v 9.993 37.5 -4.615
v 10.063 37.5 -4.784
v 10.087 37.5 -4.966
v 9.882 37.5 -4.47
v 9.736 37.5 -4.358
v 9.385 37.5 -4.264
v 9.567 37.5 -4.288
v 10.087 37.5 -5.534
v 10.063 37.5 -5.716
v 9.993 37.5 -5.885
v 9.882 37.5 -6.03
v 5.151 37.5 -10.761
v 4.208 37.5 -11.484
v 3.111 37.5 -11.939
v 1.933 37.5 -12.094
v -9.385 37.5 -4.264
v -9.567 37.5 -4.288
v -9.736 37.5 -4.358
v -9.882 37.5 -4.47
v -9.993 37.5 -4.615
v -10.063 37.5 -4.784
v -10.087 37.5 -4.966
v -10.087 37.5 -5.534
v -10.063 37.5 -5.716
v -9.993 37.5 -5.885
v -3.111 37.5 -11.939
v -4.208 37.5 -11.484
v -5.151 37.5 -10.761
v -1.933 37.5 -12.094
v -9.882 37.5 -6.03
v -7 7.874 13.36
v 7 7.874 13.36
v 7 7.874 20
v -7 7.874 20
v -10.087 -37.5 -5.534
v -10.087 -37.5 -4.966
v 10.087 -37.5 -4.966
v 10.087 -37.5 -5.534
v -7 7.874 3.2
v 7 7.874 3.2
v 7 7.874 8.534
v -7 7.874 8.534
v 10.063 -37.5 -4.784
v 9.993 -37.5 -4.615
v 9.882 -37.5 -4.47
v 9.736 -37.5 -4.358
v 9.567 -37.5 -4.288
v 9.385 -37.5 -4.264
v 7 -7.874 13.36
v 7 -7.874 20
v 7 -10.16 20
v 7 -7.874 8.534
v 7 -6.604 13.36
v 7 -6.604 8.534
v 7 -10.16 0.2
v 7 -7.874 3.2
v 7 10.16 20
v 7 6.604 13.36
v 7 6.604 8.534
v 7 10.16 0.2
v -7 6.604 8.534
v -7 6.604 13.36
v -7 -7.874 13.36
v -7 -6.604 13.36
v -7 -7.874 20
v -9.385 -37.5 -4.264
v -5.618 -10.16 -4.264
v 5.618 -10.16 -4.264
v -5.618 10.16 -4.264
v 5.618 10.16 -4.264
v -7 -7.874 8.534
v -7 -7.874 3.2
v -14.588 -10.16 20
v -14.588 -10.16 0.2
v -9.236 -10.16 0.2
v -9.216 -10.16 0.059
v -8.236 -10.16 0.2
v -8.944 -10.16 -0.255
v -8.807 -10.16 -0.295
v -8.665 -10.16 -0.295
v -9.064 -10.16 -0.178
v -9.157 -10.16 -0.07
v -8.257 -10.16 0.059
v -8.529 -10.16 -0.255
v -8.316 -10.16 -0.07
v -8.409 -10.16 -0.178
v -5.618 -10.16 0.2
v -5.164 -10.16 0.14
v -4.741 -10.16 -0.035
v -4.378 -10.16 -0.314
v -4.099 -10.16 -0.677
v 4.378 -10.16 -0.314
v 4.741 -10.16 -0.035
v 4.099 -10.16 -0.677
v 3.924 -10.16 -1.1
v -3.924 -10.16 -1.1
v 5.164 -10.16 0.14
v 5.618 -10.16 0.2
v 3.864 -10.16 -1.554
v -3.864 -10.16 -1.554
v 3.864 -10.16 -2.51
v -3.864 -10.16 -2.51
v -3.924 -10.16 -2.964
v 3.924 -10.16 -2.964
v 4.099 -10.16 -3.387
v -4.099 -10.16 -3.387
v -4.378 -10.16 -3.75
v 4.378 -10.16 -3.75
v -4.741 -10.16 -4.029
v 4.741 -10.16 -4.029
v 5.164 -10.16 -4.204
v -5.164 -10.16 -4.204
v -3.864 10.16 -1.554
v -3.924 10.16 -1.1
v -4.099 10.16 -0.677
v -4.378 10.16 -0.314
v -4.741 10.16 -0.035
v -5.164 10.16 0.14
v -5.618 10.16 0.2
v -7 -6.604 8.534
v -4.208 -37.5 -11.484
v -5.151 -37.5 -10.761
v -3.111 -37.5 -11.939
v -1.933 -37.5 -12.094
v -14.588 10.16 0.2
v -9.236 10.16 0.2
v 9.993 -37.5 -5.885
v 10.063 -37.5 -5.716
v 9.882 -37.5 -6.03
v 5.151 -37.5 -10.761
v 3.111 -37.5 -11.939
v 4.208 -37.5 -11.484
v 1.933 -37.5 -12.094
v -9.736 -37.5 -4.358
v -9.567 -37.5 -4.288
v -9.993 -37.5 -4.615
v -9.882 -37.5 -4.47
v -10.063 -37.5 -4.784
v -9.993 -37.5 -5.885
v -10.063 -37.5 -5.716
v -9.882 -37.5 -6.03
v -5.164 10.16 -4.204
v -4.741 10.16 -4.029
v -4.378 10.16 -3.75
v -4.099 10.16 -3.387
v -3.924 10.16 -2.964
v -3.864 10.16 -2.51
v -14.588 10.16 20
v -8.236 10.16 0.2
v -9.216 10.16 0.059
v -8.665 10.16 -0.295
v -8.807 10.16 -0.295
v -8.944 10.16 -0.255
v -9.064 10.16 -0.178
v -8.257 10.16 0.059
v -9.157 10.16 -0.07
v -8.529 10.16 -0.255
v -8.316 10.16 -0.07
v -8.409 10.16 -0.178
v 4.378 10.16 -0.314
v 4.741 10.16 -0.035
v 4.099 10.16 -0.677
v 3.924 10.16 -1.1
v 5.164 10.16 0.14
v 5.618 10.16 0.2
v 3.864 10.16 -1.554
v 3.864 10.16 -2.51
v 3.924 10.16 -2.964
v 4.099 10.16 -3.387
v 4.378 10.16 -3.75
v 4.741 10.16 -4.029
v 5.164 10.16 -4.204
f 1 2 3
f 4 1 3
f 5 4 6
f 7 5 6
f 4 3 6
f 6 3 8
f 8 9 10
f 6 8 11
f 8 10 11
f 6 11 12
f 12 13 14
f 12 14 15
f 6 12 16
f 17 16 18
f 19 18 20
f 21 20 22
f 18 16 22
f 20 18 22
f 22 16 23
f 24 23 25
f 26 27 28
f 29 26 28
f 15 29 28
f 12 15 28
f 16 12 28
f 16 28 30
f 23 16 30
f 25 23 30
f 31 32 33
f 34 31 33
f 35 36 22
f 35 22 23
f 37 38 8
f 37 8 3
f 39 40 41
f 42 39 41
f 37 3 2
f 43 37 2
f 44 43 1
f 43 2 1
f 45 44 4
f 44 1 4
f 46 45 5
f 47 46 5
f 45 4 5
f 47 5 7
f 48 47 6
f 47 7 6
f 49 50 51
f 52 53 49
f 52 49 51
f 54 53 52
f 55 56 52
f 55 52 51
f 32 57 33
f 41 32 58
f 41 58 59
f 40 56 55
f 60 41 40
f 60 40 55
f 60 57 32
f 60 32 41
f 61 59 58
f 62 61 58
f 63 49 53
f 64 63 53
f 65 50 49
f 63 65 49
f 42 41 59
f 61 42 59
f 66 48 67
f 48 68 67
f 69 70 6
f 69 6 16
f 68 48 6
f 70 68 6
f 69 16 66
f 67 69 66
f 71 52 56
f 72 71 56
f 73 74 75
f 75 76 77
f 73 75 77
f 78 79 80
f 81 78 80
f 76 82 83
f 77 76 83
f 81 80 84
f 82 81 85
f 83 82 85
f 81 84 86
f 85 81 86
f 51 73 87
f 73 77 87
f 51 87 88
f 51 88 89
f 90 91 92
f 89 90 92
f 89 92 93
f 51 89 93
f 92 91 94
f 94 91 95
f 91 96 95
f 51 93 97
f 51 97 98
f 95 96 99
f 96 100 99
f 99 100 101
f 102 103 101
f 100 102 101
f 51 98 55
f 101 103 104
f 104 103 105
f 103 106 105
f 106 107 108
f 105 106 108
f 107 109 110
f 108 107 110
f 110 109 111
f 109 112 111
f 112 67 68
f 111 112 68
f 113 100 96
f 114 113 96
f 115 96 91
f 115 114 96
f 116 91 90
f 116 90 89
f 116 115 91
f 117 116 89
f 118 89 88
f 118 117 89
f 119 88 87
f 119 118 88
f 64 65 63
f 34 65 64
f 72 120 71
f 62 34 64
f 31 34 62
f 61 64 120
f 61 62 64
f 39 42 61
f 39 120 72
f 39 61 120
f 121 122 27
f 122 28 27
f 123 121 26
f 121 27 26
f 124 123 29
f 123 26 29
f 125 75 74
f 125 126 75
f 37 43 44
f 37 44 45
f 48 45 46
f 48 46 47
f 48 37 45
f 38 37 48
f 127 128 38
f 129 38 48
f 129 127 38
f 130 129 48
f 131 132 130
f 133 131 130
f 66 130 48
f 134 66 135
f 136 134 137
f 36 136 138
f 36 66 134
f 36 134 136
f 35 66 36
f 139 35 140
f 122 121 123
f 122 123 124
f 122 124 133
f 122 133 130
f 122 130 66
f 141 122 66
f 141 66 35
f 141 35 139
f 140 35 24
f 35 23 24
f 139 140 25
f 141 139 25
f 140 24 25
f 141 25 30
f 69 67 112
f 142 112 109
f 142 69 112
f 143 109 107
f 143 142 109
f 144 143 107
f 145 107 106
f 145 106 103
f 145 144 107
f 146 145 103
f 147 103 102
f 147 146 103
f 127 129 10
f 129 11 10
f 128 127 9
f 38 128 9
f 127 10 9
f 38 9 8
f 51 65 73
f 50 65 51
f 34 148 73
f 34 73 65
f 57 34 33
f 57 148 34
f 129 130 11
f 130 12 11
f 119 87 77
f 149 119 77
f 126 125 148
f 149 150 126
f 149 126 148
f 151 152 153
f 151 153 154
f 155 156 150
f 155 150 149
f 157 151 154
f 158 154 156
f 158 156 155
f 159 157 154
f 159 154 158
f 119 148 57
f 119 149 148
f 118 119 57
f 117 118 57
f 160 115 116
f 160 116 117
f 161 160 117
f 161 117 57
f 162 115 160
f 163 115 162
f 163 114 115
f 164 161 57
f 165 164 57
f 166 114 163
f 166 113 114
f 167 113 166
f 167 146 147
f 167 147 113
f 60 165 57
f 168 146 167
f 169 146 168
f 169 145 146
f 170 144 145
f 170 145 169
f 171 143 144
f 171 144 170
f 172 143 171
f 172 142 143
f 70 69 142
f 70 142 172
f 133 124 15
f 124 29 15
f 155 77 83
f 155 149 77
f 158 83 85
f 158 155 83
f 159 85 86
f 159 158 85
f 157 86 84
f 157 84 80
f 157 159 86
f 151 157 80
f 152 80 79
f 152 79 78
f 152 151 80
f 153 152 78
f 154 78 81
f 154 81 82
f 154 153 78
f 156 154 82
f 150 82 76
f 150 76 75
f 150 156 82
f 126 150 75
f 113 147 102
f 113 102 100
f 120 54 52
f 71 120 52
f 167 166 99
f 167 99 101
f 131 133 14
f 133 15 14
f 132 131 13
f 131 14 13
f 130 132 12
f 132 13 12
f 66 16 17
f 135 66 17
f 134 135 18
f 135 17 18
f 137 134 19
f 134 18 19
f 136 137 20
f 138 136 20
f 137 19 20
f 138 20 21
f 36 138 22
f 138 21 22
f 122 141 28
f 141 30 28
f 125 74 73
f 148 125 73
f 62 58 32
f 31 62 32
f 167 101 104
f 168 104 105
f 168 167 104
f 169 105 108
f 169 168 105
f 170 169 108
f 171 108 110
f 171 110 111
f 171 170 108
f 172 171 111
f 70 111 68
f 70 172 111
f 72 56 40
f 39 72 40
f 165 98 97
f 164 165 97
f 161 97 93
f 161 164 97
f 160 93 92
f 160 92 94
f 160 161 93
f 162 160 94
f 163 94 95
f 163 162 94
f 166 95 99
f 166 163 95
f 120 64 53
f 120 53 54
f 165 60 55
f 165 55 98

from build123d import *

# Parameters (mm, degrees)
BOSS_EXTRUDE6_DEPTH = 37.5
BOSS_EXTRUDE1_DEPTH = 10.16
CUT_EXTRUDE4_DEPTH  = 14


with BuildPart() as part:
    # Sketch15 → Boss-Extrude6 (new, symmetric)
    with BuildSketch(Plane(origin=(0, 0, 0), x_dir=(1, 0, 0), z_dir=(0, 1, 0))):
        with BuildLine():
            Line((-5.617617549, 4.264), (-9.385342517, 4.264))
            ThreePointArc((-9.385342517, 4.264), (-9.881519345, 4.469523172), (-10.087042517, 4.9657))
            Line((-10.087042517, 4.9657), (-10.087042517, 5.533957914))
            ThreePointArc((-10.087042517, 5.533957914), (-10.03362862, 5.802487278), (-9.881518735, 6.030135353))
            Line((-9.881518735, 6.030135353), (-5.15064406, 10.76099839))
            ThreePointArc((-5.15064406, 10.76099839), (-3.674584079, 11.747268168), (-1.933453584, 12.0936))
            Line((-1.933453584, 12.0936), (1.933453584, 12.0936))
            ThreePointArc((1.933453584, 12.0936), (3.674584079, 11.747268168), (5.15064406, 10.76099839))
            Line((5.15064406, 10.76099839), (9.881518735, 6.030135353))
            ThreePointArc((9.881518735, 6.030135353), (10.03362862, 5.802487278), (10.087042517, 5.533957914))
            Line((10.087042517, 5.533957914), (10.087042517, 4.9657))
            ThreePointArc((10.087042517, 4.9657), (9.881519345, 4.469523172), (9.385342517, 4.264))
            Line((9.385342517, 4.264), (5.617617549, 4.264))
            Line((5.617617549, 4.264), (-5.617617549, 4.264))
        make_face()
    extrude(amount=BOSS_EXTRUDE6_DEPTH, both=True)

    # Sketch1 → Boss-Extrude1 (add, symmetric)
    with BuildSketch(Plane(origin=(0, 0, 0), x_dir=(1, 0, 0), z_dir=(0, 1, 0))):
        with BuildLine():
            Line((-14.587702875, -0.2), (-14.587702875, -20))
            Line((-14.587702875, -20), (7, -20))
            Line((7, -20), (7, -0.2))
            Line((7, -0.2), (5.617617549, -0.2))
            ThreePointArc((5.617617549, -0.2), (4.377622689, 0.313622689), (3.864, 1.553617549))
            Line((3.864, 1.553617549), (3.864, 2.510382451))
            ThreePointArc((3.864, 2.510382451), (4.377622689, 3.750377311), (5.617617549, 4.264))
            Line((5.617617549, 4.264), (5.617617549, 5))
            Line((5.617617549, 5), (-5.617617549, 5))
            Line((-5.617617549, 5), (-5.617617549, 4.264))
            ThreePointArc((-5.617617549, 4.264), (-4.377622689, 3.750377311), (-3.864, 2.510382451))
            Line((-3.864, 2.510382451), (-3.864, 1.553617549))
            ThreePointArc((-3.864, 1.553617549), (-4.377622689, 0.313622689), (-5.617617549, -0.2))
            Line((-5.617617549, -0.2), (-8.236278456, -0.2))
            ThreePointArc((-8.236278456, -0.2), (-8.736202395, 0.29992394), (-9.236126335, -0.2))
            Line((-9.236126335, -0.2), (-14.587702875, -0.2))
        make_face()
    extrude(amount=BOSS_EXTRUDE1_DEPTH, both=True)

    # Sketch12 → Cut-Extrude4 (cut)
    with BuildSketch(Plane(origin=(7, 0, 0), x_dir=(0, 0, -1), z_dir=(1, 0, 0))):
        Polygon((-22.36, 7.874), (-22.36, -7.874), (-13.36, -7.874), (-13.36, -6.604), (-8.534, -6.604), (-8.534, -7.874), (-3.2, -7.874), (-3.2, 7.874), (-8.534, 7.874), (-8.534, 6.604), (-13.36, 6.604), (-13.36, 7.874), align=None)
    extrude(amount=-CUT_EXTRUDE4_DEPTH, mode=Mode.SUBTRACT)


solid = part.part
